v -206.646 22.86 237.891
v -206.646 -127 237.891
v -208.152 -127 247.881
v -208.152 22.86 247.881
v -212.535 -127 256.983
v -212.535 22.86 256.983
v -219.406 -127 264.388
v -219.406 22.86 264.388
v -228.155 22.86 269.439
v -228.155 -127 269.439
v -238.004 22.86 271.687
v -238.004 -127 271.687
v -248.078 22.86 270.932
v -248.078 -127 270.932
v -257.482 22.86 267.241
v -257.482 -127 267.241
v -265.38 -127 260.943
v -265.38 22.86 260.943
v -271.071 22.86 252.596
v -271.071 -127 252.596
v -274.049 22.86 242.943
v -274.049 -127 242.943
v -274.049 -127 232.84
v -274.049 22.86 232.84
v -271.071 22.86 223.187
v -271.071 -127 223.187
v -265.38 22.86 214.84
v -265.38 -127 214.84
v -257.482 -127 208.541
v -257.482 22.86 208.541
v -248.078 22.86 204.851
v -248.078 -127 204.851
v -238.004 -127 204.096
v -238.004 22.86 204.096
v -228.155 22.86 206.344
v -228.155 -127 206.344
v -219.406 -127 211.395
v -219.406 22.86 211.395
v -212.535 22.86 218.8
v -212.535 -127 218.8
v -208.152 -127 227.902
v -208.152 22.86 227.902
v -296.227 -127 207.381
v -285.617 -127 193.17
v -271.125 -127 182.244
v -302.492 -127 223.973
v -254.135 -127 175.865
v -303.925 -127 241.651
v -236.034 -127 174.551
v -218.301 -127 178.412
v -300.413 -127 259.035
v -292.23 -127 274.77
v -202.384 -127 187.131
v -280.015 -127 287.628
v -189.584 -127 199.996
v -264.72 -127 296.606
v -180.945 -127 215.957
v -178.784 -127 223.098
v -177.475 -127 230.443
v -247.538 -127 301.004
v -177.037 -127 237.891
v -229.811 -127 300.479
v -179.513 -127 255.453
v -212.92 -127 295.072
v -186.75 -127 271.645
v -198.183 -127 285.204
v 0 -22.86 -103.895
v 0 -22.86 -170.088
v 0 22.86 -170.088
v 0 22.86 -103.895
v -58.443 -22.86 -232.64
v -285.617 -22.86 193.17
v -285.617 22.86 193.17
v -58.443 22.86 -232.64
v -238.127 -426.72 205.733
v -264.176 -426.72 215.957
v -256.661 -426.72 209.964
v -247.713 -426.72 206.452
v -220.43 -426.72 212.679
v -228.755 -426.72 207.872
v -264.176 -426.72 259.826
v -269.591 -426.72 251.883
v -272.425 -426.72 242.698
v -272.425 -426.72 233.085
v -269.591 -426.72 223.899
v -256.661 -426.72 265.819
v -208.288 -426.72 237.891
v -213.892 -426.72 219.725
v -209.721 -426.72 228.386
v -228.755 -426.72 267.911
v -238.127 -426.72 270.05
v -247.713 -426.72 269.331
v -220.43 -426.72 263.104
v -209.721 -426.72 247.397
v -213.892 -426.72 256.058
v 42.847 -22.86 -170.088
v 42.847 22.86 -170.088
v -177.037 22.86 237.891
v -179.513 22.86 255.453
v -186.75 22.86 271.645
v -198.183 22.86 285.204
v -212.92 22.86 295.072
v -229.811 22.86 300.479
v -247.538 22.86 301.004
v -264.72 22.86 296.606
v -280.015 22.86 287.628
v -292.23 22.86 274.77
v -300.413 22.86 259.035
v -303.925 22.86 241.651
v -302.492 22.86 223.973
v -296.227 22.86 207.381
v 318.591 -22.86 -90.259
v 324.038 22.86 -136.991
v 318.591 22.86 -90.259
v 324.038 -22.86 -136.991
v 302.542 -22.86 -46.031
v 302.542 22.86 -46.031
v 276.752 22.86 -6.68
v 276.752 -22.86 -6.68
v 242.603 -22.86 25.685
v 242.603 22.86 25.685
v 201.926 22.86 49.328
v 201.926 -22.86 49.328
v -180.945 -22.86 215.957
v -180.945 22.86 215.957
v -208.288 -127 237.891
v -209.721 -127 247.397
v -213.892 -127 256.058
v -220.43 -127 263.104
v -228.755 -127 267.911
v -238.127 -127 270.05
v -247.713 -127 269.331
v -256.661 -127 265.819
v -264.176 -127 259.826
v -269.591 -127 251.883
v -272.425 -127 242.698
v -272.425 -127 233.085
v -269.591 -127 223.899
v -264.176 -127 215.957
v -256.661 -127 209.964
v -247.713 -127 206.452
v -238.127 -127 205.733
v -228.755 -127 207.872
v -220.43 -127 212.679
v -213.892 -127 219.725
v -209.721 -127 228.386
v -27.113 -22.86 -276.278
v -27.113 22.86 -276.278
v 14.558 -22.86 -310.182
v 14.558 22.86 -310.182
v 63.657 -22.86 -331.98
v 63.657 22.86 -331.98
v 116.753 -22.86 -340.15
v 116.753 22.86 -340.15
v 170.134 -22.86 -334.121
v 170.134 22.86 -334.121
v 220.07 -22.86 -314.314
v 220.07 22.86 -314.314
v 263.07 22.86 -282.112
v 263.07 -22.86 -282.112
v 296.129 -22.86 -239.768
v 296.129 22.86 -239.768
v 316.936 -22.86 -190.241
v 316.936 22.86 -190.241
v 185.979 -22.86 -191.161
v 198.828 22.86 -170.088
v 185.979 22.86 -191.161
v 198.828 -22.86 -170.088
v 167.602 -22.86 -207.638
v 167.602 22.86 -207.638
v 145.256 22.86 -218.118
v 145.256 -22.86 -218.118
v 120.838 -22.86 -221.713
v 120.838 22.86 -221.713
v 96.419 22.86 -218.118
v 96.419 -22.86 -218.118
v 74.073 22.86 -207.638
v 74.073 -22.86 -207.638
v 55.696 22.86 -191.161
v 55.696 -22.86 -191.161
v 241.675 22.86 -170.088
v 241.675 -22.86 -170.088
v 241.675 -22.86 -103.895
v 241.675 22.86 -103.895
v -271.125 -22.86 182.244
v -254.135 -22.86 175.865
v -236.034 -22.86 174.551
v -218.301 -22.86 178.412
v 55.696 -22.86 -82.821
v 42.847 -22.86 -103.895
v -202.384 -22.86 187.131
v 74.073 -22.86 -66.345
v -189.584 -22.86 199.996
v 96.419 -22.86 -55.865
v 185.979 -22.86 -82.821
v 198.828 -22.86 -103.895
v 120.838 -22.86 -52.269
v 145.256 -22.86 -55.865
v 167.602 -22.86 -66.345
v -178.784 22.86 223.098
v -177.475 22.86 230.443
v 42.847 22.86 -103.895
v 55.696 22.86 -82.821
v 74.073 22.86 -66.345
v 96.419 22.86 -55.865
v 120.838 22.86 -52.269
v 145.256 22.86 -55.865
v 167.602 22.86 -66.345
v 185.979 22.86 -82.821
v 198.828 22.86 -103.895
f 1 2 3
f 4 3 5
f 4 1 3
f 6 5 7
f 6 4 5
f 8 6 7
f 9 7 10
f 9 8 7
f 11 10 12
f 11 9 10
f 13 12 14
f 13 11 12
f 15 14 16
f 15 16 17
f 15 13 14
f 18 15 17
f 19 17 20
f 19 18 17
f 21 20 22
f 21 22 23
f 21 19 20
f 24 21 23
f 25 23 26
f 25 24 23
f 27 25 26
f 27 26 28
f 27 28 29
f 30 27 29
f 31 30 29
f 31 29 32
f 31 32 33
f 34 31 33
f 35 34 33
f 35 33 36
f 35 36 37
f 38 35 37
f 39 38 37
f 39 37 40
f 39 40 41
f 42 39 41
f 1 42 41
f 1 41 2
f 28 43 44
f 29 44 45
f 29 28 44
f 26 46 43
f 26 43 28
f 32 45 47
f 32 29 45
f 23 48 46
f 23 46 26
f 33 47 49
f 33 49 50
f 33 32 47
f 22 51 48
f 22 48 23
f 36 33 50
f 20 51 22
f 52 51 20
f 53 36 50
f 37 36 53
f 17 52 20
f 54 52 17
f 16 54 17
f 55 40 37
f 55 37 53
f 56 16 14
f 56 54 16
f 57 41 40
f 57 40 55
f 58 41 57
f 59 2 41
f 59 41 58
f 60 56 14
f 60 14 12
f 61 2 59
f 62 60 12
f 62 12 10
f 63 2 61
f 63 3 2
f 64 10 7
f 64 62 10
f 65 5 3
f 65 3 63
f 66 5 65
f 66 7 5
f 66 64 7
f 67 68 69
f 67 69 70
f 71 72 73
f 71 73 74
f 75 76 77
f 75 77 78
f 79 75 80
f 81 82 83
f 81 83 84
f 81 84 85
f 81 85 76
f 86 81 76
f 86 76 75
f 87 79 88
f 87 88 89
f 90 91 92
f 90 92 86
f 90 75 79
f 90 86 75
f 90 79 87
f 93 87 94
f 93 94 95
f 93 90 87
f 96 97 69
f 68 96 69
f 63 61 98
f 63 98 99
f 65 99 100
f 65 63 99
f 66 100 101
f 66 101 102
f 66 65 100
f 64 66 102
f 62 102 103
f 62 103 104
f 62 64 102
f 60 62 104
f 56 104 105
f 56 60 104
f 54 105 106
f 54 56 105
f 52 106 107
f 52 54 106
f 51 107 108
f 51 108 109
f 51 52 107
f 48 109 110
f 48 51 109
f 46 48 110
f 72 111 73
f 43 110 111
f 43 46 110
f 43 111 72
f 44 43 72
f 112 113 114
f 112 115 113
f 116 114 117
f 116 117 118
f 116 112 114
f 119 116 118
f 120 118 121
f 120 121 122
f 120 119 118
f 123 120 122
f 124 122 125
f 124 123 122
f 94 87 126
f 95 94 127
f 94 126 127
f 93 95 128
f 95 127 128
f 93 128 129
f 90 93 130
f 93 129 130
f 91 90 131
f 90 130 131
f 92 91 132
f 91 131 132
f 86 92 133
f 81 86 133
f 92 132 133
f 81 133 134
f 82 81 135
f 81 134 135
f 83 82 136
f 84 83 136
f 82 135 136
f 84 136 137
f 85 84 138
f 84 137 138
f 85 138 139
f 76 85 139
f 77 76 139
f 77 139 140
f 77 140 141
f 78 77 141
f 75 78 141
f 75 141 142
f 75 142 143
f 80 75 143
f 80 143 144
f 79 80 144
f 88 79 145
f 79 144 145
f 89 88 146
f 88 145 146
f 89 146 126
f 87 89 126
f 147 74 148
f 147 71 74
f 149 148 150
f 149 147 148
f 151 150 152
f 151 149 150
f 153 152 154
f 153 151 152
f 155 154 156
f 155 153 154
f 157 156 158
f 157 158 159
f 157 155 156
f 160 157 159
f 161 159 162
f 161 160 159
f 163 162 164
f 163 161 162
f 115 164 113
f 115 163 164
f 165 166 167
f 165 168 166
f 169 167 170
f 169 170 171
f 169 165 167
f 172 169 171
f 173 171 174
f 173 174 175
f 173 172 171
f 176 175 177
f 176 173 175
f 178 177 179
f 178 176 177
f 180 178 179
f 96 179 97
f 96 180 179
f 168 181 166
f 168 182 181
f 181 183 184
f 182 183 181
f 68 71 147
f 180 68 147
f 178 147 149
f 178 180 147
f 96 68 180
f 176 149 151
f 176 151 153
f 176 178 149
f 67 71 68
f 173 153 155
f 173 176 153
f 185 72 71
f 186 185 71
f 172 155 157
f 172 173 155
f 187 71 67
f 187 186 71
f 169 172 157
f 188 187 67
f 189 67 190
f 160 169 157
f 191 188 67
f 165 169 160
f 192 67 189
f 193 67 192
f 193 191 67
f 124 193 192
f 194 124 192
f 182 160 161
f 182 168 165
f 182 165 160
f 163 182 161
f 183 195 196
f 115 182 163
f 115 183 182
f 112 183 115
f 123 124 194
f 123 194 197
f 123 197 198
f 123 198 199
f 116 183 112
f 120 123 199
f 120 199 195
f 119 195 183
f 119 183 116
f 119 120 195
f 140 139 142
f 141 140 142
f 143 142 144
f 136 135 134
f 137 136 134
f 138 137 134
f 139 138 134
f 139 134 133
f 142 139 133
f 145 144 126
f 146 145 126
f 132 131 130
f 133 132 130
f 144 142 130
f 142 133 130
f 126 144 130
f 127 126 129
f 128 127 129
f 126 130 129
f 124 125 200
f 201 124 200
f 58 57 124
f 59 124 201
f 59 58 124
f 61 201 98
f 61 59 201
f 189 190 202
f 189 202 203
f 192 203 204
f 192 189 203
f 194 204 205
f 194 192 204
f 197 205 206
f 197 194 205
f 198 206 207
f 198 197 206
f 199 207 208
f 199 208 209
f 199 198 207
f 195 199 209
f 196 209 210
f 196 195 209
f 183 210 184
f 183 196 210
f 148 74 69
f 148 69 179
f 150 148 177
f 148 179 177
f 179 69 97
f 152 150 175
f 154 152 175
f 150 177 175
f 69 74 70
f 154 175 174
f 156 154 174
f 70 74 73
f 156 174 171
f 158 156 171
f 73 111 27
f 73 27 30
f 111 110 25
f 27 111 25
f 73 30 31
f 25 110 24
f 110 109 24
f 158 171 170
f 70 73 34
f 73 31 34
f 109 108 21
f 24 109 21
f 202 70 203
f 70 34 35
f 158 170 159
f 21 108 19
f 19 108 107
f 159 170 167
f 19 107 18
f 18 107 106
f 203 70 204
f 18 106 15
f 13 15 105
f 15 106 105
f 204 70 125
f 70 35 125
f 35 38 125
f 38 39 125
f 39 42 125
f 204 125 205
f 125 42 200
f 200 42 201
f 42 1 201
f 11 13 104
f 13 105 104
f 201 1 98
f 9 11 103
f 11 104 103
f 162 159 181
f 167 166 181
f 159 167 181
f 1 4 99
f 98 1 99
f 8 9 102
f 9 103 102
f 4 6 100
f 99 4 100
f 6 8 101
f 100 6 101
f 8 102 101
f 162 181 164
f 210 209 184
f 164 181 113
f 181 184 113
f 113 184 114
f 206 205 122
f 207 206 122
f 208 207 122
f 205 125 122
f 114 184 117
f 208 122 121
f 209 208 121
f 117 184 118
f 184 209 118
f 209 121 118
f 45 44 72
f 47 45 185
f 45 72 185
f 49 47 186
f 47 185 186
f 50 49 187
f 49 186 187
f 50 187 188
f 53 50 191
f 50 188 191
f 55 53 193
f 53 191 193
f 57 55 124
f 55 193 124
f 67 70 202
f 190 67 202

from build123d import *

# Parameters (mm, degrees)
F0_R     = 33.890494
F1_DEPTH = 22.86
F2_DEPTH = 127
F3_R     = 32.248305
F4_DEPTH = 299.72


with BuildPart() as f1:
    # F0 (on Front) → F1 (new body, symmetric)
    with BuildSketch(Plane.XZ):
        with BuildLine():
            ThreePointArc((-180.945197, 215.957069), (-227.028764, 175.844782), (-285.61664, 193.169662))
            Line((-285.61664, 193.169662), (-58.443356, -232.639542))
            ThreePointArc((-58.443356, -232.639542), (-28.450369, 0.861151), (201.925635, 49.328142))
            Line((201.925635, 49.328142), (-180.945197, 215.957069))
        make_face()
        with BuildLine():
            ThreePointArc((201.925635, 49.328142), (-28.450369, 0.861151), (-58.443356, -232.639542))
            ThreePointArc((-58.443356, -232.639542), (170.134403, -334.12099), (324.037641, -136.991415))
            ThreePointArc((324.037641, -136.991415), (290.789576, -25.606587), (201.925635, 49.328142))
        make_face()
        with BuildLine():
            Line((42.847402, -170.087546), (0, -170.087546))
            Line((0, -170.087546), (0, -103.895283))
            Line((0, -103.895283), (42.847402, -103.895283))
            ThreePointArc((42.847402, -103.895283), (120.837641, -52.269332), (198.82788, -103.895283))
            Line((198.82788, -103.895283), (241.675282, -103.895283))
            Line((241.675282, -103.895283), (241.675282, -170.087546))
            Line((241.675282, -170.087546), (198.82788, -170.087546))
            ThreePointArc((198.82788, -170.087546), (120.837641, -221.713497), (42.847402, -170.087546))
        make_face(mode=Mode.SUBTRACT)
        with BuildLine():
            ThreePointArc((-180.945197, 215.957069), (-178.021371, 226.751495), (-177.036581, 237.89145))
            ThreePointArc((-177.036581, 237.89145), (-264.719904, 296.606157), (-285.61664, 193.169662))
            ThreePointArc((-285.61664, 193.169662), (-227.028764, 175.844782), (-180.945197, 215.957069))
        make_face()
        with Locations((-240.536581, 237.89145)):
            Circle(F0_R, mode=Mode.SUBTRACT)
    extrude(amount=F1_DEPTH, both=True)

    # F0 (on Front) → F2 (join)
    with BuildSketch(Plane.XZ):
        with BuildLine():
            ThreePointArc((-180.945197, 215.957069), (-178.021371, 226.751495), (-177.036581, 237.89145))
            ThreePointArc((-177.036581, 237.89145), (-264.719904, 296.606157), (-285.61664, 193.169662))
            ThreePointArc((-285.61664, 193.169662), (-227.028764, 175.844782), (-180.945197, 215.957069))
        make_face()
        with Locations((-240.536581, 237.89145)):
            Circle(F0_R, mode=Mode.SUBTRACT)
    extrude(amount=F2_DEPTH)


with BuildPart() as f4:
    # F3 (on face) → F4 (new body)
    with BuildSketch(Plane.XZ.offset(127)):
        with Locations((-240.536581, 237.89145)):
            Circle(F3_R)
    extrude(amount=F4_DEPTH)


solid = Compound([f1.part, f4.part])
